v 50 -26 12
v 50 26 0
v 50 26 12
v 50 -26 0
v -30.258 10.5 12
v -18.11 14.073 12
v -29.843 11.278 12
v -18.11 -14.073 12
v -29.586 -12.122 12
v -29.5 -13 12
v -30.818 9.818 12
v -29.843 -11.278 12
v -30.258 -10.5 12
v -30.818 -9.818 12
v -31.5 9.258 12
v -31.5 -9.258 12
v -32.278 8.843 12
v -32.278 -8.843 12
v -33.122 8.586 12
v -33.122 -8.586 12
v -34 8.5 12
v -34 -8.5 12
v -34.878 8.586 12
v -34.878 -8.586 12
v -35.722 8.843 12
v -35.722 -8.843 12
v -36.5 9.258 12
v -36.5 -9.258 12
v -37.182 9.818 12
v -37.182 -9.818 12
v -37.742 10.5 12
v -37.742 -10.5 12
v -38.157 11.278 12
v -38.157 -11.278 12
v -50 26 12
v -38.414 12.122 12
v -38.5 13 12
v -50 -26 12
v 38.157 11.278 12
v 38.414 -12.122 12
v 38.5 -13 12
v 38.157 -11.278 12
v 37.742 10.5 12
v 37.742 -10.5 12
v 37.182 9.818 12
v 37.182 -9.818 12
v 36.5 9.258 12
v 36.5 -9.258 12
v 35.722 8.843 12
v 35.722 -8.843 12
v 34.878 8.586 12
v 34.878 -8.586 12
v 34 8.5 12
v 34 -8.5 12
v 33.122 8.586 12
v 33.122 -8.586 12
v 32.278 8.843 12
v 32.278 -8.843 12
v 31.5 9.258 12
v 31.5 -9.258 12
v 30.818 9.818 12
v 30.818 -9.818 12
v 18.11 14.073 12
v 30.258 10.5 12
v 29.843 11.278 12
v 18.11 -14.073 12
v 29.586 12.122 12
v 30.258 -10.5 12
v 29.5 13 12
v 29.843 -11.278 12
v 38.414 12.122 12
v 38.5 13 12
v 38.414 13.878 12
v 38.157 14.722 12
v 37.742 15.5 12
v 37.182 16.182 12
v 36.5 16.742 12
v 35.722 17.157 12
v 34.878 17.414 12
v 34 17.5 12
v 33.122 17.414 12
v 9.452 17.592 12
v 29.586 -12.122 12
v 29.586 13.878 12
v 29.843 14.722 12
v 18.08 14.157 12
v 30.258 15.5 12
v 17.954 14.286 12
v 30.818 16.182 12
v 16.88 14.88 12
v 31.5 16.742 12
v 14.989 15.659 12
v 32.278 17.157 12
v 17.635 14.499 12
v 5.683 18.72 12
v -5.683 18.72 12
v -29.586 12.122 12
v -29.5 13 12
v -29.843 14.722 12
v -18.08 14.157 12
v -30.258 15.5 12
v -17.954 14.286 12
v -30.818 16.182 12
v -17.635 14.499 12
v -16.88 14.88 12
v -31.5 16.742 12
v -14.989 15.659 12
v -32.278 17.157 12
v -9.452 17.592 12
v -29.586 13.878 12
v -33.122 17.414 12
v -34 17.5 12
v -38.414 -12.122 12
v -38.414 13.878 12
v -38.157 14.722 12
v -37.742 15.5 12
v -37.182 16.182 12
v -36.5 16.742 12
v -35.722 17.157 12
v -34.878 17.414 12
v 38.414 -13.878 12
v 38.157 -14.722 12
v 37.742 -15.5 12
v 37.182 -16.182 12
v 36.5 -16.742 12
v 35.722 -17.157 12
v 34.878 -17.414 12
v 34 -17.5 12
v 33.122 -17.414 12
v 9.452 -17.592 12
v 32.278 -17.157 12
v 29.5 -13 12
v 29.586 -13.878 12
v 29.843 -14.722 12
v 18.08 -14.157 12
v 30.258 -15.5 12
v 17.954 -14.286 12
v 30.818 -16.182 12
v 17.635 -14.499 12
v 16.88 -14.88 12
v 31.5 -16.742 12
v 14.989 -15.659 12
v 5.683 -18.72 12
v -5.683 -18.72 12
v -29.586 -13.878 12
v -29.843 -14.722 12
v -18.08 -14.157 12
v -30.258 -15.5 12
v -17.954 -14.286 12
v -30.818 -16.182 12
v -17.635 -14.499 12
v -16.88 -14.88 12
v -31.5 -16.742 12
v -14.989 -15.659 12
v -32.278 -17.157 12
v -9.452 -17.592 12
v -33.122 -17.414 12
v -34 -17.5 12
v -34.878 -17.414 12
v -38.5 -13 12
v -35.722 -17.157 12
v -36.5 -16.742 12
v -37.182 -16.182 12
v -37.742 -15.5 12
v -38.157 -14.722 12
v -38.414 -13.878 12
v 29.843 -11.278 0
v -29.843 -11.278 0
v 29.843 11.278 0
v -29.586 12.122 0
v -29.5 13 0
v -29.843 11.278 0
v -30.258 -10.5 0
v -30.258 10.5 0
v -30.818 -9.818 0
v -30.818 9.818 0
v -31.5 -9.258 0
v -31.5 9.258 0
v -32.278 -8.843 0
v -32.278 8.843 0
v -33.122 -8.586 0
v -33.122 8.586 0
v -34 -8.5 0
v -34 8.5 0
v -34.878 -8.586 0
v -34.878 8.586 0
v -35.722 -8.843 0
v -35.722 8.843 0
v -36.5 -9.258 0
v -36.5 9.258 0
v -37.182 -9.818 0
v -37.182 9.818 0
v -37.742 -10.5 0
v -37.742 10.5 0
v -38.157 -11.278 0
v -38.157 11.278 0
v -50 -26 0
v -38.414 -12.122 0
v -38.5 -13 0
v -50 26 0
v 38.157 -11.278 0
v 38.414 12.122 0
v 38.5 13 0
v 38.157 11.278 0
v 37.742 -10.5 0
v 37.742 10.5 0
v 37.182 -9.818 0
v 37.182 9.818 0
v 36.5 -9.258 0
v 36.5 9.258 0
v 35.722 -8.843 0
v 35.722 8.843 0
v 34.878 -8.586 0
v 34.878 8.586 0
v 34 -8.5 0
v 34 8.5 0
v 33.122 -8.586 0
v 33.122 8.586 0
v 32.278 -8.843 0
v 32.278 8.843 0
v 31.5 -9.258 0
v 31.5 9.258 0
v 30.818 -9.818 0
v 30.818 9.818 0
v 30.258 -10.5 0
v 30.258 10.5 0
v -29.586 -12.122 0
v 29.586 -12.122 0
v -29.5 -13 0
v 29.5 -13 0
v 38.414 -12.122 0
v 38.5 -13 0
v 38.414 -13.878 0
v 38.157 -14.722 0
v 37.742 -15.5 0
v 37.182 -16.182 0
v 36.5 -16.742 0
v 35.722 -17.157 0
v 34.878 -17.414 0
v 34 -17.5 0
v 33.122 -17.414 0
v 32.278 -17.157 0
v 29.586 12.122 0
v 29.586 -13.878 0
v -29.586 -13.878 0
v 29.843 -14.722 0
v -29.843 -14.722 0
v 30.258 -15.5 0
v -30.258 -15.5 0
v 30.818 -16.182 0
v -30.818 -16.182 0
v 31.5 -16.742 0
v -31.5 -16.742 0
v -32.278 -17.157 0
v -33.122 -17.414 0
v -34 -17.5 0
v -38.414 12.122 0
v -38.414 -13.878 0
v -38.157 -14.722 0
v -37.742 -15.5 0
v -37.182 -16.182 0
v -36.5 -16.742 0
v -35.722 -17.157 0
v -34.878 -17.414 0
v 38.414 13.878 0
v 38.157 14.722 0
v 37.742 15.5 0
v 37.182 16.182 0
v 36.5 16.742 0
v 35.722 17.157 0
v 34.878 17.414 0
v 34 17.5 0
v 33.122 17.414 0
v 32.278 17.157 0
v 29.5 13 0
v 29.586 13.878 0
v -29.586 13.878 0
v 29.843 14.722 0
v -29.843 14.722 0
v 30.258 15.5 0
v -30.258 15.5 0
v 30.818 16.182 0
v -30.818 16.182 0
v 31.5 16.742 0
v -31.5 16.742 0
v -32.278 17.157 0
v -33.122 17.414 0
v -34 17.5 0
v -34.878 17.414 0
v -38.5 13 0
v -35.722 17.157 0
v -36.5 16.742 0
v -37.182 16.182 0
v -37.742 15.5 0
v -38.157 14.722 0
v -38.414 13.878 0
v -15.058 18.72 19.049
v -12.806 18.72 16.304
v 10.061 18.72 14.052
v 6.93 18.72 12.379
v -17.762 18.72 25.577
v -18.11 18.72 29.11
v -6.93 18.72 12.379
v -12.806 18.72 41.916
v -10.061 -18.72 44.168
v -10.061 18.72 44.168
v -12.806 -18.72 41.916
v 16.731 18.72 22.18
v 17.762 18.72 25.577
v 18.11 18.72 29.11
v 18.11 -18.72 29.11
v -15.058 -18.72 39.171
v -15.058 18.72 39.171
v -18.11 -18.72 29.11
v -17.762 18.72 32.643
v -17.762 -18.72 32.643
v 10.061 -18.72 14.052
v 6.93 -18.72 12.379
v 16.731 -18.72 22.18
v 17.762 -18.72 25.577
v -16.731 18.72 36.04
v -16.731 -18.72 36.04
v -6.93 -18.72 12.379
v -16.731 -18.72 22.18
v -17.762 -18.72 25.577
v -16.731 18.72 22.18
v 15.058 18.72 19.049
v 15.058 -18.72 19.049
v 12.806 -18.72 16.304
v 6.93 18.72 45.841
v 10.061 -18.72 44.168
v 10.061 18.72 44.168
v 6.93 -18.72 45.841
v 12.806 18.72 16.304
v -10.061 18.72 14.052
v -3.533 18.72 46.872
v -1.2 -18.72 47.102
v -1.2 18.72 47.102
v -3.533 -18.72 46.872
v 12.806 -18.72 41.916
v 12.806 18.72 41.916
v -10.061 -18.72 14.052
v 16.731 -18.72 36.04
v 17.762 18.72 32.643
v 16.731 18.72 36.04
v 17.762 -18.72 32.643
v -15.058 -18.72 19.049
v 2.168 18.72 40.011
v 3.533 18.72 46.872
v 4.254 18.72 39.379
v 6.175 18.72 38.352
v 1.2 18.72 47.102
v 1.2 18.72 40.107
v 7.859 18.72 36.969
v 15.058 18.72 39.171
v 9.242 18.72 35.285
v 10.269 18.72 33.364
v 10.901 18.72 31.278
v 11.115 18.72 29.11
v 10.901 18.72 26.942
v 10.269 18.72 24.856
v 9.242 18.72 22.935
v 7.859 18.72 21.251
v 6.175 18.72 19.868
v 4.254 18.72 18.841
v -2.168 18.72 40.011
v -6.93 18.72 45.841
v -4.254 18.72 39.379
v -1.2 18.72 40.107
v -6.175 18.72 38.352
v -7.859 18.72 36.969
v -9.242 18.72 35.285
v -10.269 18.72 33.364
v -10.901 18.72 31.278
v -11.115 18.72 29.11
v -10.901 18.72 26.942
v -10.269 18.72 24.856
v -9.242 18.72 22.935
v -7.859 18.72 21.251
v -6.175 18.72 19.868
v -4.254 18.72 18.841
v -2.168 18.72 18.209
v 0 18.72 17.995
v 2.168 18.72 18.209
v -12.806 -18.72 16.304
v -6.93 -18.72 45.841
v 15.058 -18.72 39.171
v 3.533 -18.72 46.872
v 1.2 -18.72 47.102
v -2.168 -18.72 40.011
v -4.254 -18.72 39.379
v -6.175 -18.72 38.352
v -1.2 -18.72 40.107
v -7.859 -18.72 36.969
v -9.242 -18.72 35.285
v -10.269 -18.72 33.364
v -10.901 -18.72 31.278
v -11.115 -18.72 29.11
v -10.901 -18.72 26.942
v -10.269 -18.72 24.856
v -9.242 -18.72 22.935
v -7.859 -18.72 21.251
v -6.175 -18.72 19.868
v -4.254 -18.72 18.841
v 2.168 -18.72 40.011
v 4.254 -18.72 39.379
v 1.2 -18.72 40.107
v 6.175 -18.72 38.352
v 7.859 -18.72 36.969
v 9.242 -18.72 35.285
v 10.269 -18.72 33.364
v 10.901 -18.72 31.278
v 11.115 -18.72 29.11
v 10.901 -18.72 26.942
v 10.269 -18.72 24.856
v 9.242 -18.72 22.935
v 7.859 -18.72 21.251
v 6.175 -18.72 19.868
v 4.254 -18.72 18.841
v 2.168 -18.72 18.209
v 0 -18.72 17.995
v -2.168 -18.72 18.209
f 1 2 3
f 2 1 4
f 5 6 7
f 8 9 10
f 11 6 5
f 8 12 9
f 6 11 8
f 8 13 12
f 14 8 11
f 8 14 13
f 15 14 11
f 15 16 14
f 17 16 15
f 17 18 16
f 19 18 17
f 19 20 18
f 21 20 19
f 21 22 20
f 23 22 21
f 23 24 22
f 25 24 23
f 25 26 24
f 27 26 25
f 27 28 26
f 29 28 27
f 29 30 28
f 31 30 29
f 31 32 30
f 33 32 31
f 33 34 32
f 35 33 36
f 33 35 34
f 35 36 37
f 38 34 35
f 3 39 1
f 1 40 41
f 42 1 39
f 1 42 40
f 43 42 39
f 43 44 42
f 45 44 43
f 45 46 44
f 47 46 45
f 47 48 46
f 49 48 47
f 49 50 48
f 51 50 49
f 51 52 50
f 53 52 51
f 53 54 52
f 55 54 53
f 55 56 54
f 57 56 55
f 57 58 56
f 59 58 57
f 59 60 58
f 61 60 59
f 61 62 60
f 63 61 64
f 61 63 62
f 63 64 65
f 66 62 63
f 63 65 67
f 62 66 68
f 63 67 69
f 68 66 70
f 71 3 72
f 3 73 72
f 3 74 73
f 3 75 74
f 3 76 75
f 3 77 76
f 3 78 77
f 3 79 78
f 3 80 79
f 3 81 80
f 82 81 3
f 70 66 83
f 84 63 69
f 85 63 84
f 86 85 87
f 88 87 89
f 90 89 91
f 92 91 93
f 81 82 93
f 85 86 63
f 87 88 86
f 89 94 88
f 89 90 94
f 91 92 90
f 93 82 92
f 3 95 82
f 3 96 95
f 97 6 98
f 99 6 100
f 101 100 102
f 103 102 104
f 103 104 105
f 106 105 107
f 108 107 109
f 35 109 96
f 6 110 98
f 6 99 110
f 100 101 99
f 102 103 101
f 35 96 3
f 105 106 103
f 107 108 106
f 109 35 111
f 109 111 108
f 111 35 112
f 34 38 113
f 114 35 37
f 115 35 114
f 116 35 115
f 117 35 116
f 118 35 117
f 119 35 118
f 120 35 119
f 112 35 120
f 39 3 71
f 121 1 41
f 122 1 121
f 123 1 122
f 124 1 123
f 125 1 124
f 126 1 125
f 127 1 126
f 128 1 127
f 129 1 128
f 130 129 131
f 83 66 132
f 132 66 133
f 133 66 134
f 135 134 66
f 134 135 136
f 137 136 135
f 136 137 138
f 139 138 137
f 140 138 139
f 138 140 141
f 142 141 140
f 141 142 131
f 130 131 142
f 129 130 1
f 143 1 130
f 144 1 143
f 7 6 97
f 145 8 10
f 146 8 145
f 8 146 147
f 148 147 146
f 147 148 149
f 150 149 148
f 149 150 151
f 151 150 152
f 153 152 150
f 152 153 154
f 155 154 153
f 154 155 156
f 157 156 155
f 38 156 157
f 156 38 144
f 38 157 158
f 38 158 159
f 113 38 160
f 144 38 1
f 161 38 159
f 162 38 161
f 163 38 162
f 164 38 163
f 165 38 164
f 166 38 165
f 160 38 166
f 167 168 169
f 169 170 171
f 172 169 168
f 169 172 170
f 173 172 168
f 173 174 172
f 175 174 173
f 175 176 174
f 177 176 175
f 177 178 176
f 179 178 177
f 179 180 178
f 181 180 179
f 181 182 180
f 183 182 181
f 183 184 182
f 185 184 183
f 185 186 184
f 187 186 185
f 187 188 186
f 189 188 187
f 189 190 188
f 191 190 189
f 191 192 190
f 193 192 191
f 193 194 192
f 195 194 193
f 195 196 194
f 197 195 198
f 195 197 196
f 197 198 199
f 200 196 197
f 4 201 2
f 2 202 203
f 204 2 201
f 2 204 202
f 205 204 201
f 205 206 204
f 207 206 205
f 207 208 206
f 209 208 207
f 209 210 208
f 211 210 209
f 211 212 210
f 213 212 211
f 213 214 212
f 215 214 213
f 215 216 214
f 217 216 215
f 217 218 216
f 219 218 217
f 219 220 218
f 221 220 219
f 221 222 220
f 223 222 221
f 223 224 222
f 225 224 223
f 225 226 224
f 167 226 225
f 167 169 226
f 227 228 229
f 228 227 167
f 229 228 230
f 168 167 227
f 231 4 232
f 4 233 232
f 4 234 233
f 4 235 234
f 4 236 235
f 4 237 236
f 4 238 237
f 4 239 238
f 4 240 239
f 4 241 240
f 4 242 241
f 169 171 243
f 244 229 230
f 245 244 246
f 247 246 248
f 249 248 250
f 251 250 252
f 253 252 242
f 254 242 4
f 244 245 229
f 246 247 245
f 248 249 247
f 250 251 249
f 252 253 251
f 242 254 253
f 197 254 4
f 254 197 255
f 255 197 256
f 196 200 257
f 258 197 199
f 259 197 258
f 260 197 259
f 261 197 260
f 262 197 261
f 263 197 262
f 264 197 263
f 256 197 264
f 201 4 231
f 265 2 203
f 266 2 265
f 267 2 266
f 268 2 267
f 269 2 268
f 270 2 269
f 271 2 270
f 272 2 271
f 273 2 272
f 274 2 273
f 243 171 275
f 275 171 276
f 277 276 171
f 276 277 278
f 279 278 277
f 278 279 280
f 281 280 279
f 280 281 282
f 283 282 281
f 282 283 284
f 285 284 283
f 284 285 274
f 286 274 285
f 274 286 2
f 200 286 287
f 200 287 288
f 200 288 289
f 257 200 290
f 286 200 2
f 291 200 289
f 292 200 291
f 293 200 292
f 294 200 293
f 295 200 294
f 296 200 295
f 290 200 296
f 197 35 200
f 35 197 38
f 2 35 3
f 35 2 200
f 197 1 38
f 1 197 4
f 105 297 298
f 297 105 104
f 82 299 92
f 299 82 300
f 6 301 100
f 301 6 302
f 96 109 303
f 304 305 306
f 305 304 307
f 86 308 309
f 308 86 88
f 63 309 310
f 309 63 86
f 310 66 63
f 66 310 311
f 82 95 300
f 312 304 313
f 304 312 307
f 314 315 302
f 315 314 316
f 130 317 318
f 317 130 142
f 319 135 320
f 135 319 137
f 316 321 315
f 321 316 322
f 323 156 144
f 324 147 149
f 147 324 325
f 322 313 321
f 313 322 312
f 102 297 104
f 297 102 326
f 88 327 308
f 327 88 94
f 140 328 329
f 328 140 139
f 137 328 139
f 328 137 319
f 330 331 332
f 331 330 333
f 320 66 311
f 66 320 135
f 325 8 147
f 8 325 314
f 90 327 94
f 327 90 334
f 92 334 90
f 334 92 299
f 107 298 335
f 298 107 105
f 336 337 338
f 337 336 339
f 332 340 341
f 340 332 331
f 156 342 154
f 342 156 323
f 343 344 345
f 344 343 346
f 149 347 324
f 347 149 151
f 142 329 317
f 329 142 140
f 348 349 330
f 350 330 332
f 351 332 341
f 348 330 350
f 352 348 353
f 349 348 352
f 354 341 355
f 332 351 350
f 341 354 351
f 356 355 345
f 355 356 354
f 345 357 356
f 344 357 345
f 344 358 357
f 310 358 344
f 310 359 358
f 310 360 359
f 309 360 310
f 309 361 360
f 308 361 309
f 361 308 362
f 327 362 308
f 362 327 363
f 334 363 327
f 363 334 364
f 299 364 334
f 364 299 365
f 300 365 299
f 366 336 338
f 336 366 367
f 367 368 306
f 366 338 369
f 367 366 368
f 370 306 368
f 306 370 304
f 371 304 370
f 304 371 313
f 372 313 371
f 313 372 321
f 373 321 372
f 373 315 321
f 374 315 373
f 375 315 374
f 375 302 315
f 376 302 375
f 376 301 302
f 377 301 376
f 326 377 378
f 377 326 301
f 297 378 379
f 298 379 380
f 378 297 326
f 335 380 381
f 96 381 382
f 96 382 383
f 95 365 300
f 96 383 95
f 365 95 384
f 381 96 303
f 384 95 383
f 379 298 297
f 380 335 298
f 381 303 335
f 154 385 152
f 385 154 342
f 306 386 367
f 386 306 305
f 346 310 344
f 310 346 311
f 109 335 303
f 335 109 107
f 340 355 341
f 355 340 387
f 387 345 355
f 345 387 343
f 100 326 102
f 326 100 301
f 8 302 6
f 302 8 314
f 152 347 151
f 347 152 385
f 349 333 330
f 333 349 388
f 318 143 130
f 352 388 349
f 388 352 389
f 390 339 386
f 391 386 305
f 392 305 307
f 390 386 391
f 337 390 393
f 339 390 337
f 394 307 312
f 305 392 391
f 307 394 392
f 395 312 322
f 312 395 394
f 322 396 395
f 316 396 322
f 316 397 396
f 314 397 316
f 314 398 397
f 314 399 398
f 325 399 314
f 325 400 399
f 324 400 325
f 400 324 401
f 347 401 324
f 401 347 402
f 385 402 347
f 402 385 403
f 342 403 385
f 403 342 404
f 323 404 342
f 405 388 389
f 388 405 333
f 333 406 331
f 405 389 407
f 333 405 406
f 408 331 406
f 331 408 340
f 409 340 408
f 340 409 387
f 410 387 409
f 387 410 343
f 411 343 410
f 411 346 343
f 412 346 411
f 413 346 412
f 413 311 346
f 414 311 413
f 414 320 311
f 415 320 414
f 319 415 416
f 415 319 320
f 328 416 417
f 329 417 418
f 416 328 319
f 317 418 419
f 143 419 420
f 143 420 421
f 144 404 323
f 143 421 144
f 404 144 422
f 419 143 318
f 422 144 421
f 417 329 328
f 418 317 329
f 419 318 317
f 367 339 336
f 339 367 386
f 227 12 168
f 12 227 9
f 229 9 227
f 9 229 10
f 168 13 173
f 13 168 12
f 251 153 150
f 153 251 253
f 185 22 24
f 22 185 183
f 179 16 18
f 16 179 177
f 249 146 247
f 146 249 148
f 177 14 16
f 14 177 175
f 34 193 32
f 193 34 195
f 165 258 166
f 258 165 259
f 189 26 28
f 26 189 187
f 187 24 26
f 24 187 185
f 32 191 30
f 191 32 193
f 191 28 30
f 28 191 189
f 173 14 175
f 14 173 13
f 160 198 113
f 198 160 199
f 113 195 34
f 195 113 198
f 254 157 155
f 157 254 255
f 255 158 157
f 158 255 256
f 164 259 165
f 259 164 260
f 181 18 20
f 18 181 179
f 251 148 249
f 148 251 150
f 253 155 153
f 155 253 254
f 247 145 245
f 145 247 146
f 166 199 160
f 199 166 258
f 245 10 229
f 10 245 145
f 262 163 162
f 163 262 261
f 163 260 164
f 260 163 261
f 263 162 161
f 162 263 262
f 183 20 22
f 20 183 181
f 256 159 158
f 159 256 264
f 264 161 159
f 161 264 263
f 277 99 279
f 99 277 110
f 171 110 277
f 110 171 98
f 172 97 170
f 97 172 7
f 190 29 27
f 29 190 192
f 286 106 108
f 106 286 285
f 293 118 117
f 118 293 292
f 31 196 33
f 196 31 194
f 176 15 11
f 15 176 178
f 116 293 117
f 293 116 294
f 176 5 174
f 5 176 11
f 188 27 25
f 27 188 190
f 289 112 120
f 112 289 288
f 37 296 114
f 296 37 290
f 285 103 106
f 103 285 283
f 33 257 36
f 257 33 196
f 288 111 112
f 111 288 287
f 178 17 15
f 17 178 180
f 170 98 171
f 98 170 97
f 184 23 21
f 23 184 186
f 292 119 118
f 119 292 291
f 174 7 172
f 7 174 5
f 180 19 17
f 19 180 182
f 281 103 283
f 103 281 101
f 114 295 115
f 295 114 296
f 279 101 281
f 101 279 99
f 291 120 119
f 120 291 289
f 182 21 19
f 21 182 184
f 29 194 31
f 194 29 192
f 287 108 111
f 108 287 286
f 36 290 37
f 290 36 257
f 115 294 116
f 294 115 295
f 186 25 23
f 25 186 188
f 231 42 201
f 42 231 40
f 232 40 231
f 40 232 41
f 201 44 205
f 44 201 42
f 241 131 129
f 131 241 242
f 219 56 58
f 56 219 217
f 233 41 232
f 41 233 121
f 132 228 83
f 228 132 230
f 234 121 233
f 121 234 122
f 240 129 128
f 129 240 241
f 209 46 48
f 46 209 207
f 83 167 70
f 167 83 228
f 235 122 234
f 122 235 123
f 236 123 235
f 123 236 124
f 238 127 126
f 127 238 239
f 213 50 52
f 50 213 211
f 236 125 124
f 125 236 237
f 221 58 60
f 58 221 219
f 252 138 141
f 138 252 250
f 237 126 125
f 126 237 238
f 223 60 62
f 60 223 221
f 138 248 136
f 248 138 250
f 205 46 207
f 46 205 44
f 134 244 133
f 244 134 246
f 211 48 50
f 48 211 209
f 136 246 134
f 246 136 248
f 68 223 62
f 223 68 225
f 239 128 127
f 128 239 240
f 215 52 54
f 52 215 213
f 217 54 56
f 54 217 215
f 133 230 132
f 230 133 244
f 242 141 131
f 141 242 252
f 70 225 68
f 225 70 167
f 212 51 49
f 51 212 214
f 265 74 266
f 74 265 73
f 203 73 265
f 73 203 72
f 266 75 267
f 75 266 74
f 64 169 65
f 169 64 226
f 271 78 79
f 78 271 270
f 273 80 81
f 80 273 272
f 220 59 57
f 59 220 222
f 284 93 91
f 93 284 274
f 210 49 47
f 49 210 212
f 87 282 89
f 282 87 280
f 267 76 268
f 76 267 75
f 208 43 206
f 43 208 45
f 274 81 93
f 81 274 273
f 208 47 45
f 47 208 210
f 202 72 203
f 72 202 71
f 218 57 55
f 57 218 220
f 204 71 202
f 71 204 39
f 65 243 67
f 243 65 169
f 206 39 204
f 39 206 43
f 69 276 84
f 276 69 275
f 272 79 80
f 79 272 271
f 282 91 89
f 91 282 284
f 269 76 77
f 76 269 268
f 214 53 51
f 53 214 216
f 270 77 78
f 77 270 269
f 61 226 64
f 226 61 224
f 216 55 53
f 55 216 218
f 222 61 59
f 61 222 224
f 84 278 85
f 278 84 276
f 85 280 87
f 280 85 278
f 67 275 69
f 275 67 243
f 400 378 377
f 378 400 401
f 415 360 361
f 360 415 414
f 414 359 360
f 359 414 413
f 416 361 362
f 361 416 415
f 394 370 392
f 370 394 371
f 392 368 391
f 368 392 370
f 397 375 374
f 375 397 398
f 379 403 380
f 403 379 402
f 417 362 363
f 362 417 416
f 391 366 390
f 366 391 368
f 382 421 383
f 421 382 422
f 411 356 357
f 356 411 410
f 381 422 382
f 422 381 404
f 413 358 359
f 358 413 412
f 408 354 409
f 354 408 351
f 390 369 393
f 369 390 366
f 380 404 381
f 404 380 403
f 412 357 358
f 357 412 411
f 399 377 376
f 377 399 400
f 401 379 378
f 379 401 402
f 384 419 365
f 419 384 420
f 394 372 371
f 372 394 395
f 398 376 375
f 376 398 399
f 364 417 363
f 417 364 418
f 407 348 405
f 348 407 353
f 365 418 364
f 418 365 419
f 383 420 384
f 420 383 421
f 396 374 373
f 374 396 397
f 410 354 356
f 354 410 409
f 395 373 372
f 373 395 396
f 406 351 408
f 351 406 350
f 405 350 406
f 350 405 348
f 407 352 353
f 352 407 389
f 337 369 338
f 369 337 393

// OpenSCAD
$fn = 32;

// ----------------------------------------------------------------------
// Bearing block: 100 x 52 mm base, 22.23 mm bore at 29.11 mm
// ----------------------------------------------------------------------

// --- parameters (mm) ---
base_w = 100;             // base width
base_d = 52;              // base depth
base_t = 12;              // base thickness
bore_d = 22.23;           // shaft / bearing bore
house_r = 18.11;          // housing outer radius
house_len = 37.44;        // housing length along the shaft
foot_w = 36.22;           // foot width under the housing
foot_len = 27.44;         // foot length along the shaft
axis_z = 29.11;           // bore axis height above the base
holes_d = 9;              // mounting holes
hole_x = 34;              // mounting hole spacing
groove_w = 2.4;           // oil groove width

difference() {
  union() {
    /* base plate with its underside on z = 0 */
    translate([0, 0, base_t / 2]) cube([base_w, base_d, base_t], center = true);
    /* hull foot: a straight web blending into the round housing */
    hull() {
      translate([0, 0, base_t - 0.5]) cube([foot_w, foot_len, 1.6], center = true);
      translate([0, 0, axis_z]) rotate([-90, 0, 0]) cylinder(h = house_len, d = 2 * house_r, center = true);
    }
  }
  /* bore through the housing, 2.5 mm clear on both sides */
  translate([0, 0, axis_z]) rotate([-90, 0, 0]) cylinder(h = house_len + 5, d = bore_d, center = true);
  /* oil groove from the top of the housing into the bore */
  translate([-groove_w / 2, -house_len / 2 - 2.5, axis_z + bore_d * 0.17]) cube([groove_w, house_len + 5, house_r + 5]);
  /* mounting holes through the base plate */
  for (hx = [-34, 34]) {
    for (hy = [-13, 13]) {
      translate([hx, hy, -2.5]) cylinder(h = base_t + 5, d = holes_d);
    }
  }
}
